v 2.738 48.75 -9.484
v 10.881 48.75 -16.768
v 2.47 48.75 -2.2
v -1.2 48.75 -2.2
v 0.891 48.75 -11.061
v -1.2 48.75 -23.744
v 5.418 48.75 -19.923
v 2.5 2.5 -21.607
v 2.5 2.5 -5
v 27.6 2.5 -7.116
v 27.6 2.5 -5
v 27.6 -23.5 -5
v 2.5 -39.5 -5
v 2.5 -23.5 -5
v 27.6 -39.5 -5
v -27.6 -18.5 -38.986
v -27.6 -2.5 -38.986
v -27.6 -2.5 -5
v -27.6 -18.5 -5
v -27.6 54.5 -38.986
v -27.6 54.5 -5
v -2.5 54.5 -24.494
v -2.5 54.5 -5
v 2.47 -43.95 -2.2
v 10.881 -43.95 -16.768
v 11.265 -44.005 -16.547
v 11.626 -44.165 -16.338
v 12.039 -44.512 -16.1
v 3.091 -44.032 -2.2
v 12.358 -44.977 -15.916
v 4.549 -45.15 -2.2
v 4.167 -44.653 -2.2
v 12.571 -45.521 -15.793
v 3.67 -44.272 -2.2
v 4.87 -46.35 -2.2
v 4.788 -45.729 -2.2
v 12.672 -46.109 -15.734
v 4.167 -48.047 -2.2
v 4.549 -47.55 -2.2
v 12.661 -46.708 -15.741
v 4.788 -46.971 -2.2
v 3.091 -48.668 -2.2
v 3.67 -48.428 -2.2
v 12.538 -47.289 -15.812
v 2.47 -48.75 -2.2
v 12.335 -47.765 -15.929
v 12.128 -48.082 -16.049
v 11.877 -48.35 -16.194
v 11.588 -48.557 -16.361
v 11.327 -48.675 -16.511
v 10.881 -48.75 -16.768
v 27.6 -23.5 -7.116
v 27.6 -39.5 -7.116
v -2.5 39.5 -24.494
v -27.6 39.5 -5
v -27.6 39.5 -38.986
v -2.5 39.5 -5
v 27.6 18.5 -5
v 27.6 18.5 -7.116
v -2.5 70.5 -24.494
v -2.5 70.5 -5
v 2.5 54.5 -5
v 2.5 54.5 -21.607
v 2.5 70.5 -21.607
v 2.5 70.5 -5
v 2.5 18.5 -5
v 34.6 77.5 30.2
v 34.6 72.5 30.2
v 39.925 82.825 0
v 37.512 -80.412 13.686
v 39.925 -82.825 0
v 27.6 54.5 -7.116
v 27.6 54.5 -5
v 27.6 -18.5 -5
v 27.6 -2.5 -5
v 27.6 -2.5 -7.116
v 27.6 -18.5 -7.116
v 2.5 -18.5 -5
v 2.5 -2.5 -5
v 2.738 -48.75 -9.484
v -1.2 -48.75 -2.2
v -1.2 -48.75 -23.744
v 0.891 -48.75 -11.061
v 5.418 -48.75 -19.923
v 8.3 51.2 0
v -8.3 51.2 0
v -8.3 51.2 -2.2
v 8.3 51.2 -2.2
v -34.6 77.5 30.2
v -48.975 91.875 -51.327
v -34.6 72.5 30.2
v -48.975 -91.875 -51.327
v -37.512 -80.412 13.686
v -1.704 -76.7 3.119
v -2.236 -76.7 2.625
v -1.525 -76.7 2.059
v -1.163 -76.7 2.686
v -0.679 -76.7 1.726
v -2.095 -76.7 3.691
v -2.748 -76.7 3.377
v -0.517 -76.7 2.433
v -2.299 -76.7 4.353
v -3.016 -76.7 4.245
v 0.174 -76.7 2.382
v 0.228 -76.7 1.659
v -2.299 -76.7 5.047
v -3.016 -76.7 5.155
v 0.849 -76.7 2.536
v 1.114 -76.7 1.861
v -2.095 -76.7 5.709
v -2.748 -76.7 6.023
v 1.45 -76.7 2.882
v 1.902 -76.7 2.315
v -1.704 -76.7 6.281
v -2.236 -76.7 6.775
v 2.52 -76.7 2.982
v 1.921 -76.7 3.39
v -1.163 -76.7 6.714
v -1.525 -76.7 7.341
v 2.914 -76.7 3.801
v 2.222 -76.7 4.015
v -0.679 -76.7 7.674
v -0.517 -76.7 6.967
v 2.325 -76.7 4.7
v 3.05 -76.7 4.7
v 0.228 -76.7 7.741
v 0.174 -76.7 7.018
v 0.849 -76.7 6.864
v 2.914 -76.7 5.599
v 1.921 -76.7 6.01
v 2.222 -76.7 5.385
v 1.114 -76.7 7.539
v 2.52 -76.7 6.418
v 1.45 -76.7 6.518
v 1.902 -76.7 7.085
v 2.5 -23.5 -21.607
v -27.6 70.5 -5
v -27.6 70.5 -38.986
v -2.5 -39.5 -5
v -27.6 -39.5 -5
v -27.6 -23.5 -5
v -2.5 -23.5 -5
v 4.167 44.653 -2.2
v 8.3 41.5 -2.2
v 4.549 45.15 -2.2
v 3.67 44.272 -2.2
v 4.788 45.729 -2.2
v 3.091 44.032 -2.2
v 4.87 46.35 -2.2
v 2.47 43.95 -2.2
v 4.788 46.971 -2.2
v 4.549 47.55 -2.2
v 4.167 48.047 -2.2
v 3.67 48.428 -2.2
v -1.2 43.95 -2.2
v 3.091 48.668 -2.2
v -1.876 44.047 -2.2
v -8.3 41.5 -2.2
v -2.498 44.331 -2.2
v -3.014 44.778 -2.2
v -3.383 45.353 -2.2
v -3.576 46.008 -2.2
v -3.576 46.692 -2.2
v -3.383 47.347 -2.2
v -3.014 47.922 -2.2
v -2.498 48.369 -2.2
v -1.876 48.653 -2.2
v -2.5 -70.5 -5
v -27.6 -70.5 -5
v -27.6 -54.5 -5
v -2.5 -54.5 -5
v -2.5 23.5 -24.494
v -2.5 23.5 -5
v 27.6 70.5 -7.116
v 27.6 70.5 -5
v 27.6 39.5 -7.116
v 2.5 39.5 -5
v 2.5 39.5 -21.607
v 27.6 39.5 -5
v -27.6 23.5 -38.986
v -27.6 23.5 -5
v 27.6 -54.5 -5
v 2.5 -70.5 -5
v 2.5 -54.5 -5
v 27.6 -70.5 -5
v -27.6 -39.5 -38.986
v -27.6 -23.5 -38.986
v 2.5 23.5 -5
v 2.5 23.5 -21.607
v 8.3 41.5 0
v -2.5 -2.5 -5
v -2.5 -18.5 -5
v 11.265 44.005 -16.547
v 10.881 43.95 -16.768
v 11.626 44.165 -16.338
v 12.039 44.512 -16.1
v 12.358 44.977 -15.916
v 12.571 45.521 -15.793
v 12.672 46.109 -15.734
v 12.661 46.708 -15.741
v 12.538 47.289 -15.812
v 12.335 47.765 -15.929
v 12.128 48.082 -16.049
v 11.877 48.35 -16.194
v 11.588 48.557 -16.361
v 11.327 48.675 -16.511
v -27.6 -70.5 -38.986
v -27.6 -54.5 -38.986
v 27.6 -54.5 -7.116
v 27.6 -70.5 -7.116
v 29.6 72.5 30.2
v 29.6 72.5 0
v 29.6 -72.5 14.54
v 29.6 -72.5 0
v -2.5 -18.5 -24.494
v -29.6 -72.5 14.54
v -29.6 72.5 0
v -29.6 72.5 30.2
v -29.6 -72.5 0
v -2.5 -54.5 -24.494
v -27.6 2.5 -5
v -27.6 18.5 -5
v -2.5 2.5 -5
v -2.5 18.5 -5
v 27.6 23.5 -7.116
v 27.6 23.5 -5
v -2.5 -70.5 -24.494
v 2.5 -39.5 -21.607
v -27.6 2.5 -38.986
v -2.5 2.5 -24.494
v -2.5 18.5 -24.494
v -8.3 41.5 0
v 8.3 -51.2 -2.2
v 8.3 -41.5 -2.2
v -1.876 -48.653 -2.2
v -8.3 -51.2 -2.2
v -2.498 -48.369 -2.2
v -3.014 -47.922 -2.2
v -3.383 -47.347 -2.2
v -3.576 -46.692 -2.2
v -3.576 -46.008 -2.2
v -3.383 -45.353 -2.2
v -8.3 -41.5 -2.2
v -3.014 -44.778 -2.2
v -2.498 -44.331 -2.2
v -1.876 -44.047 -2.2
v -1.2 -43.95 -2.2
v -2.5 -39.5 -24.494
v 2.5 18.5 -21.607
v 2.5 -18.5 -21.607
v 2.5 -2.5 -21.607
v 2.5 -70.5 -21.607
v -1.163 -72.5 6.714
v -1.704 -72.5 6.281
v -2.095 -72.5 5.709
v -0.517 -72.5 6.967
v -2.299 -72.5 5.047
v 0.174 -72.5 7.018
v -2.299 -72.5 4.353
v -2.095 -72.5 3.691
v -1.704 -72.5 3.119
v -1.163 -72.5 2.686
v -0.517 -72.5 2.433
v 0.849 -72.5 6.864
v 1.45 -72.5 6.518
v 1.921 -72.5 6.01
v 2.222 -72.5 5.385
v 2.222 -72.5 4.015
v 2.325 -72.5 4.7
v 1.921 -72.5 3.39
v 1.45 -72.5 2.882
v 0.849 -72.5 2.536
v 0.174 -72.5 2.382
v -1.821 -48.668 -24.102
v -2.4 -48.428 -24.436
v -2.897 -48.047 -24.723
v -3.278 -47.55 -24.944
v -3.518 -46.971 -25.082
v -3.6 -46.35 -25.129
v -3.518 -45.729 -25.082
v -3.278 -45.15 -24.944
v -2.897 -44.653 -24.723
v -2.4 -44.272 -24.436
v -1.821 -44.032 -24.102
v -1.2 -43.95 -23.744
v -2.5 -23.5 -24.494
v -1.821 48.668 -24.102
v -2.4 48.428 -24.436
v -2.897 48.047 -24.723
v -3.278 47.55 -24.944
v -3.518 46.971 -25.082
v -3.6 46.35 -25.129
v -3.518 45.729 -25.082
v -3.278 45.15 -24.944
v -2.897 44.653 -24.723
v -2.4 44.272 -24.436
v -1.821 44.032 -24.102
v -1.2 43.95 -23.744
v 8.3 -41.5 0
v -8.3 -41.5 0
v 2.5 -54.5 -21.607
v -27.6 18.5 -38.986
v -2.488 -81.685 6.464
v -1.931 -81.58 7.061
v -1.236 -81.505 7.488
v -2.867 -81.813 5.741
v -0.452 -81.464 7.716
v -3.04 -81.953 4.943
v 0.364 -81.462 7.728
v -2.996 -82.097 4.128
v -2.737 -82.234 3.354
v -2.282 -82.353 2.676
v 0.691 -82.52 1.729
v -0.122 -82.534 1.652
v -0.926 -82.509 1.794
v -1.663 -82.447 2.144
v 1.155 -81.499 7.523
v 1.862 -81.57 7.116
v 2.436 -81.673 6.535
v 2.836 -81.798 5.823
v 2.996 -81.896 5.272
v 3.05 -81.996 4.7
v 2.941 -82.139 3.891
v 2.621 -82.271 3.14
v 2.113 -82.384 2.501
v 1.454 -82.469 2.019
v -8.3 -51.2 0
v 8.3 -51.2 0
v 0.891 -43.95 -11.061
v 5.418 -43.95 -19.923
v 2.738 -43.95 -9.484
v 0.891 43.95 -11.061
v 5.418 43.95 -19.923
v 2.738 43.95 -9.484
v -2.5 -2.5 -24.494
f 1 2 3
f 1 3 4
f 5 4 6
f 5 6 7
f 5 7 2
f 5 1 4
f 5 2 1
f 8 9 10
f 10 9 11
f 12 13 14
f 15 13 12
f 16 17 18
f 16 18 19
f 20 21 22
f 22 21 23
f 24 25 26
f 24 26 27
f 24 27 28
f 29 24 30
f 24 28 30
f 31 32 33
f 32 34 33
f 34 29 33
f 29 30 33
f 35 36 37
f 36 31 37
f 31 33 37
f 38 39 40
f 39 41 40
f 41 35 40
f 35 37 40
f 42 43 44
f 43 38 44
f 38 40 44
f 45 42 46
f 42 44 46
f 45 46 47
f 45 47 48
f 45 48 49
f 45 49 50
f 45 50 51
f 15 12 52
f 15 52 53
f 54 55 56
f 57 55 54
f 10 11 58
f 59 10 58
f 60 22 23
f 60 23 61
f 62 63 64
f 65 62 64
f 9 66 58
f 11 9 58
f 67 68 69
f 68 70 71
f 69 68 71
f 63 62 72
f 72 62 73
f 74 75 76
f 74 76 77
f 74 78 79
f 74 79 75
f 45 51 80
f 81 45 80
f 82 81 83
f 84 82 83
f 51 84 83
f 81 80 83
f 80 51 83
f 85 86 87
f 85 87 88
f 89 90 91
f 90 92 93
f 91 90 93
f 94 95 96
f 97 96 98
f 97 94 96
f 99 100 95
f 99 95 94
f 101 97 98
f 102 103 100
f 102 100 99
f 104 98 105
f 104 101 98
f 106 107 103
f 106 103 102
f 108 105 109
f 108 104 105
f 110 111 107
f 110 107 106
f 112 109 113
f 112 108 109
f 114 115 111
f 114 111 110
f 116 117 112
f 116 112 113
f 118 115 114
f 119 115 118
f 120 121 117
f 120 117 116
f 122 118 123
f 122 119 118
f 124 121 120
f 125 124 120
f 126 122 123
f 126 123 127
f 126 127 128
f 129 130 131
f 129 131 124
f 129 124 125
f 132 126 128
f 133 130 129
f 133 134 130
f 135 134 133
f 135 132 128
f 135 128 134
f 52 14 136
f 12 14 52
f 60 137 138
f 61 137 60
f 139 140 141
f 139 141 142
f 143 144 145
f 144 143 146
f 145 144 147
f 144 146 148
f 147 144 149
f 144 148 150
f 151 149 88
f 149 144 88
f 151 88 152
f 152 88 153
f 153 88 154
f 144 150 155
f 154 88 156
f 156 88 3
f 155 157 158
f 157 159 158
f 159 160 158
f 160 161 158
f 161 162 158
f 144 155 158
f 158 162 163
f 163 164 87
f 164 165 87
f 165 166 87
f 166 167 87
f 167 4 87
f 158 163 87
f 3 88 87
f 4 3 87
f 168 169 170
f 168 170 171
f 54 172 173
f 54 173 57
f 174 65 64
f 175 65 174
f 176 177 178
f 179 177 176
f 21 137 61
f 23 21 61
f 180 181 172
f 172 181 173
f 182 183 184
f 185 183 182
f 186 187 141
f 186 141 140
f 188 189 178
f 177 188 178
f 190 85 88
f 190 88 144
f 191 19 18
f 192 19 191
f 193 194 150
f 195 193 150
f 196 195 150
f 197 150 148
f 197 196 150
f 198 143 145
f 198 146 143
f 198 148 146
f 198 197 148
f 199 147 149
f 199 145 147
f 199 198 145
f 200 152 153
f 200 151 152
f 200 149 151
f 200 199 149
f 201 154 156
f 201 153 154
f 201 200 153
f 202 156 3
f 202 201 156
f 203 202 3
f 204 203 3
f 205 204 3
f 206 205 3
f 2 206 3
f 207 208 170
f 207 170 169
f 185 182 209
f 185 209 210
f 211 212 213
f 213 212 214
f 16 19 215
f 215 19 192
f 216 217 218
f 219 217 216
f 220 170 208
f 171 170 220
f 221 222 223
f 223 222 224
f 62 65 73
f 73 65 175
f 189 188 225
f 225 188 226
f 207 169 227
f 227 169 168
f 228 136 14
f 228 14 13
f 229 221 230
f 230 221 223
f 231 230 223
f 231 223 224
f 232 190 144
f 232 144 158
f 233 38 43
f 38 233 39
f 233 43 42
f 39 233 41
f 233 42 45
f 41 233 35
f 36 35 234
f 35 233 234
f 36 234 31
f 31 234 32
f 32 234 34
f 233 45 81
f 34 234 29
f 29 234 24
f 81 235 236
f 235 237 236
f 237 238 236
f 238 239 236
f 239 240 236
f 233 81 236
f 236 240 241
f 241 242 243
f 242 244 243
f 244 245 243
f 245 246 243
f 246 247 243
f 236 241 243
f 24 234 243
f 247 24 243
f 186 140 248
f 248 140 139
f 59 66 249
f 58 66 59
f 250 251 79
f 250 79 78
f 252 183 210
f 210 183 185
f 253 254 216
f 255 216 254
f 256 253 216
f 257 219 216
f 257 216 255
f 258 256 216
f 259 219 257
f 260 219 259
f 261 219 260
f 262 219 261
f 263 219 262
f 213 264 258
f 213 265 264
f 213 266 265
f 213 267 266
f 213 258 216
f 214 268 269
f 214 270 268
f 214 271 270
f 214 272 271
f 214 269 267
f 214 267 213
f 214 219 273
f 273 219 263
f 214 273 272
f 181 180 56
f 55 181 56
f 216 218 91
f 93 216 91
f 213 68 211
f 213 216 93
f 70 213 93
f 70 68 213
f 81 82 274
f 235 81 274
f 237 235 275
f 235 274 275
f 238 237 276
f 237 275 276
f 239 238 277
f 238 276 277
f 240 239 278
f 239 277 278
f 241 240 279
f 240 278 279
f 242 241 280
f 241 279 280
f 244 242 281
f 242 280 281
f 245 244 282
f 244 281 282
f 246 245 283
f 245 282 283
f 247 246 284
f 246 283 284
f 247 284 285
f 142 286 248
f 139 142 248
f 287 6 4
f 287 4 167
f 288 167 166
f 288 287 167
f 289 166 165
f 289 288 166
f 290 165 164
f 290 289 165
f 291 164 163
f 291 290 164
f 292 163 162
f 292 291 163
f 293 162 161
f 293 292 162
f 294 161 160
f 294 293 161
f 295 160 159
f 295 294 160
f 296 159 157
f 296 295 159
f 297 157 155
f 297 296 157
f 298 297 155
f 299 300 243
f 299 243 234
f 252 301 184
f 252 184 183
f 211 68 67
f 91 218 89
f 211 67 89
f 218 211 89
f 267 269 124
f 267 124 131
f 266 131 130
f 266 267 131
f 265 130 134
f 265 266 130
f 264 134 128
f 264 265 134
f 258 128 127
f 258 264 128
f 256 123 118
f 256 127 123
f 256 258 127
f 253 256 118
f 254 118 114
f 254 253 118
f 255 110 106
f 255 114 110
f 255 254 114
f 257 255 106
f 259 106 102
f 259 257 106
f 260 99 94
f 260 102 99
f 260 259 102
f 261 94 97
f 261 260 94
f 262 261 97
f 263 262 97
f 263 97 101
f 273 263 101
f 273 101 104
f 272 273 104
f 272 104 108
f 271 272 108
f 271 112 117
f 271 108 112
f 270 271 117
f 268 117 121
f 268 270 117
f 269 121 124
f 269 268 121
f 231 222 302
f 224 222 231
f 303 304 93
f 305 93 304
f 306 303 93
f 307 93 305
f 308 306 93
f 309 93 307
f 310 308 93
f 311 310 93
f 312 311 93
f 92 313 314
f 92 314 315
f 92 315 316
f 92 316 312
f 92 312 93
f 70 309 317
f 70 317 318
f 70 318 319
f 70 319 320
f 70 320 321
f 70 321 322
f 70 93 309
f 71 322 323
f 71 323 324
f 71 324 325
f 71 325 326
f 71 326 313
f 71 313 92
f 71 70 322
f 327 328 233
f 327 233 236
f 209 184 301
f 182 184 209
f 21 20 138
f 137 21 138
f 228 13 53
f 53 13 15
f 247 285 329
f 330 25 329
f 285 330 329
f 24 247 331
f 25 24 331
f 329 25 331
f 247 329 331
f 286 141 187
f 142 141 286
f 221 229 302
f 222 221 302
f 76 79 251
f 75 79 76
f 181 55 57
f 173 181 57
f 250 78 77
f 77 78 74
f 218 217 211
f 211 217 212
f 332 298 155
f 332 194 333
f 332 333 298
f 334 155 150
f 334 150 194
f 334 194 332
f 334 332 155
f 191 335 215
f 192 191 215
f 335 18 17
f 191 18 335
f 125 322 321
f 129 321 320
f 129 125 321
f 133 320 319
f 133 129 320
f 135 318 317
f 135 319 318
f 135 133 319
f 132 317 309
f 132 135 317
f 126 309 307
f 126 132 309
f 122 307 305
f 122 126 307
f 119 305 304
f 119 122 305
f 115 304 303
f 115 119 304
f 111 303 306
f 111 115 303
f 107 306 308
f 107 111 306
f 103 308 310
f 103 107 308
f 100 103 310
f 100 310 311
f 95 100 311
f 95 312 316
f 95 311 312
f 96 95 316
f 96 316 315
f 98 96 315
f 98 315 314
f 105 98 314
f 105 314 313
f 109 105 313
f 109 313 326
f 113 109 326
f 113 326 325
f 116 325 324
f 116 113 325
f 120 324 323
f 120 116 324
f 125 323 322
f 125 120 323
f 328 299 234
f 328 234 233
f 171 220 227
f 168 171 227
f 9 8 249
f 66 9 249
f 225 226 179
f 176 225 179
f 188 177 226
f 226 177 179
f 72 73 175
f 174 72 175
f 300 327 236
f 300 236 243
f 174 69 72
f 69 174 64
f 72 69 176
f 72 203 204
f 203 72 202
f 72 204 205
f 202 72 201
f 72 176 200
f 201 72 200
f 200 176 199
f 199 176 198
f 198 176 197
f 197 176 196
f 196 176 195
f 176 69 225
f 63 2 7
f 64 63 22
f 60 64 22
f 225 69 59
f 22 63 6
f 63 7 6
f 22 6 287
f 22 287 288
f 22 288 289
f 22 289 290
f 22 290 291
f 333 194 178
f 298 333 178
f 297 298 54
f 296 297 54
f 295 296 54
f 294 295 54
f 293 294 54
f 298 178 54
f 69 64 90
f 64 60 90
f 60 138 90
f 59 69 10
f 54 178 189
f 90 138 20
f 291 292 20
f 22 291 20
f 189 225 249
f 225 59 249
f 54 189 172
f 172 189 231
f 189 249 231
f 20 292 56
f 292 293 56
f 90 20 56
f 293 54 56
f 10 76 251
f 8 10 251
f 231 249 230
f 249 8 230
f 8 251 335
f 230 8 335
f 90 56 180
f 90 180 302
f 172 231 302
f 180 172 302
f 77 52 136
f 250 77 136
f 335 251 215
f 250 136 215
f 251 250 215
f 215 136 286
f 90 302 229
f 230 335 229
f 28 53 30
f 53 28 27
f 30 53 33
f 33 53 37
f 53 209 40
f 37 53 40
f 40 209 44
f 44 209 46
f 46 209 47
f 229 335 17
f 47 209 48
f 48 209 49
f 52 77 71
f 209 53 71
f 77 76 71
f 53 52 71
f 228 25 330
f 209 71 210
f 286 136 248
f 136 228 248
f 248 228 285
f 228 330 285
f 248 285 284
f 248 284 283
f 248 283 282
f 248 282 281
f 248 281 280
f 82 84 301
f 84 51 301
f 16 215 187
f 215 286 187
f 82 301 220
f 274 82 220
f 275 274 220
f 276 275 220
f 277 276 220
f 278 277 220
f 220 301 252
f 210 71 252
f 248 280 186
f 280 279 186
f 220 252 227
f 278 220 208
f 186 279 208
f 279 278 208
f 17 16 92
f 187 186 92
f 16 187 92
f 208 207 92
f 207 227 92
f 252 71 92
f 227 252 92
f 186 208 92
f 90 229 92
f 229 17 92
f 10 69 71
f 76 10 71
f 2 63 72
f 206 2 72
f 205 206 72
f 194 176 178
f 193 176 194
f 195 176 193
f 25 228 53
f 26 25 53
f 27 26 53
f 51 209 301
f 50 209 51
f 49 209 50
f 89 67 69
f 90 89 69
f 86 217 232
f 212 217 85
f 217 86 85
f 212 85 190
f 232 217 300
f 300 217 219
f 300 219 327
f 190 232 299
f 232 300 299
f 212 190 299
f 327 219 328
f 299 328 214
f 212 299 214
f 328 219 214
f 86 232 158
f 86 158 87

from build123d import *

# Parameters (mm, degrees)
EXTRUDE008_START = 76.7
SKETCH009_R      = 3.05
EXTRUDE008_DEPTH = 923.3
EXTRUDE007_START = -5
SKETCH008_W      = 25.1
SKETCH008_H      = 16
EXTRUDE007_DEPTH = 75
EXTRUDE006_DEPTH = 60
SKETCH004_R      = 2.325
EXTRUDE005_DEPTH = 150
EXTRUDE004_DEPTH = 2.2
EXTRUDE003_DEPTH = 50
EXTRUDE001_DEPTH = 107.5
SKETCH_W         = 69.2
SKETCH_H         = 215
EXTRUDE_DEPTH    = 30.2


with BuildPart() as extrude008:
    # Sketch009 → Extrude008 (new body)
    with BuildSketch(Plane.XZ.offset(EXTRUDE008_START)):
        with Locations((0, 4.7)):
            Circle(SKETCH009_R)
    extrude(amount=EXTRUDE008_DEPTH)


with BuildPart() as extrude007:
    # Sketch008 → Extrude007 (new body)
    with BuildSketch(Plane.XY.offset(EXTRUDE007_START)):
        with Locations((-15.05, 62.5)):
            Rectangle(SKETCH008_W, SKETCH008_H)
        with Locations((15.05, 62.5)):
            Rectangle(SKETCH008_W, SKETCH008_H)
        with Locations((-15.05, 31.5)):
            Rectangle(SKETCH008_W, SKETCH008_H)
        with Locations((15.05, 31.5)):
            Rectangle(SKETCH008_W, SKETCH008_H)
        with Locations((15.05, 10.5)):
            Rectangle(SKETCH008_W, SKETCH008_H)
        with Locations((-15.05, 10.5)):
            Rectangle(SKETCH008_W, SKETCH008_H)
    extrude(amount=-EXTRUDE007_DEPTH)


with BuildPart() as part_mirroring002:
    # Part__Mirroring002: instance of Extrude007
    add(extrude007.part.mirror(Plane(origin=(0, 0, 0), x_dir=(1, 0, 0), z_dir=(0, 1, 0))))


with BuildPart() as screwslotupper:
    # Sketch006 → Loft section 0
    with BuildSketch(Plane.XY):
        with BuildLine():
            ThreePointArc((-1.2, 48.75), (-3.6, 46.35), (-1.2, 43.95))
            Line((-1.2, 43.95), (1.2, 43.95))
            ThreePointArc((1.2, 43.95), (3.6, 46.35), (1.2, 48.75))
            Line((1.2, 48.75), (-1.2, 48.75))
        make_face()
    # Sketch007 → Loft section 1
    with BuildSketch(Plane.XY.offset(-30)):
        with BuildLine():
            ThreePointArc((-1.2, 48.75), (-3.6, 46.35), (-1.2, 43.95))
            Line((-1.2, 43.95), (18.520508, 43.95))
            ThreePointArc((18.520508, 43.95), (20.920508, 46.35), (18.520508, 48.75))
            Line((18.520508, 48.75), (-1.2, 48.75))
        make_face()
    loft()


with BuildPart() as screwslotlower:
    # Part__Mirroring001: instance of ScrewSlotUpper
    add(screwslotupper.part.mirror(Plane(origin=(0, 0, 0), x_dir=(1, 0, 0), z_dir=(0, 1, 0))))


with BuildPart() as anglefacecutout:
    # Sketch005 → Extrude006 (new body, symmetric)
    with BuildSketch(Plane.YZ):
        Polygon((-117.5, 9.68), (-117.5, 30.2), (72.5, 30.2), align=None)
    extrude(amount=EXTRUDE006_DEPTH, both=True)


with BuildPart() as securityhole:
    # Sketch004 → Extrude005 (new body)
    with BuildSketch(Plane.XZ):
        with Locations((0, 4.7)):
            Circle(SKETCH004_R)
    extrude(amount=EXTRUDE005_DEPTH)


with BuildPart() as mountingsquares:
    # Sketch001 → Extrude004 (new body)
    with BuildSketch(Plane.XY):
        Polygon((0, 51.2), (-8.3, 51.2), (-8.3, 46.35), (-8.3, 41.5), (0, 41.5), (8.3, 41.5), (8.3, 46.35), (8.3, 51.2), align=None)
        Polygon((0, -51.2), (8.3, -51.2), (8.3, -46.35), (8.3, -41.5), (0, -41.5), (-8.3, -41.5), (-8.3, -46.35), (-8.3, -51.2), align=None)
    extrude(amount=-EXTRUDE004_DEPTH)


with BuildPart() as topbottomanglecutout:
    # Sketch003 → Extrude003 (new body, symmetric)
    with BuildSketch(Plane.YZ):
        Polygon((-77.5, 30.2), (-95.132698, -69.8), (-145.132698, -69.8), (-145.132698, 30.2), (-95.132698, 30.2), align=None)
        Polygon((77.5, 30.2), (95.132698, -69.8), (145.132698, -69.8), (145.132698, 30.2), (95.132698, 30.2), align=None)
    extrude(amount=EXTRUDE003_DEPTH, both=True)


with BuildPart() as extrude001:
    # Sketch002 → Extrude001 (new body, symmetric)
    with BuildSketch(Plane.XZ):
        Polygon((0, 0), (-34.6, 0), (-34.6, 30.2), (-39.925075, 0), (48.975355, -51.326687), (34.6, 30.2), (34.6, 0), align=None)
    extrude(amount=EXTRUDE001_DEPTH, both=True)


with BuildPart() as cut001:
    # Sketch → Extrude (new body)
    with BuildSketch(Plane.XY):
        Rectangle(SKETCH_W, SKETCH_H)
        Polygon((29.6, 72.5), (-29.6, 72.5), (-29.6, -72.5), (0, -72.5), (29.6, -72.5), (29.6, 0), align=None, mode=Mode.SUBTRACT)
    extrude(amount=EXTRUDE_DEPTH)

    # Fusion: union Extrude001
    add(extrude001.part)

    # Cut: cut TopBottomAngleCutout
    add(topbottomanglecutout.part, mode=Mode.SUBTRACT)

    # Cut001: cut MountingSquares
    add(mountingsquares.part, mode=Mode.SUBTRACT)


with BuildPart() as cut008:
    # Part__Mirroring: instance of Cut001
    add(cut001.part.mirror(Plane(origin=(0, 0, 0), x_dir=(0, -1, 0), z_dir=(1, 0, 0))))

    # Cut002: cut SecurityHole
    add(securityhole.part, mode=Mode.SUBTRACT)

    # Cut003: cut AngleFaceCutout
    add(anglefacecutout.part, mode=Mode.SUBTRACT)

    # Cut004: cut ScrewSlotUpper
    add(screwslotupper.part, mode=Mode.SUBTRACT)

    # Cut005: cut ScrewSlotLower
    add(screwslotlower.part, mode=Mode.SUBTRACT)

    # Cut006: cut Part__Mirroring002
    add(part_mirroring002.part, mode=Mode.SUBTRACT)

    # Cut007: cut Extrude007
    add(extrude007.part, mode=Mode.SUBTRACT)

    # Cut008: cut Extrude008
    add(extrude008.part, mode=Mode.SUBTRACT)


solid = cut008.part
